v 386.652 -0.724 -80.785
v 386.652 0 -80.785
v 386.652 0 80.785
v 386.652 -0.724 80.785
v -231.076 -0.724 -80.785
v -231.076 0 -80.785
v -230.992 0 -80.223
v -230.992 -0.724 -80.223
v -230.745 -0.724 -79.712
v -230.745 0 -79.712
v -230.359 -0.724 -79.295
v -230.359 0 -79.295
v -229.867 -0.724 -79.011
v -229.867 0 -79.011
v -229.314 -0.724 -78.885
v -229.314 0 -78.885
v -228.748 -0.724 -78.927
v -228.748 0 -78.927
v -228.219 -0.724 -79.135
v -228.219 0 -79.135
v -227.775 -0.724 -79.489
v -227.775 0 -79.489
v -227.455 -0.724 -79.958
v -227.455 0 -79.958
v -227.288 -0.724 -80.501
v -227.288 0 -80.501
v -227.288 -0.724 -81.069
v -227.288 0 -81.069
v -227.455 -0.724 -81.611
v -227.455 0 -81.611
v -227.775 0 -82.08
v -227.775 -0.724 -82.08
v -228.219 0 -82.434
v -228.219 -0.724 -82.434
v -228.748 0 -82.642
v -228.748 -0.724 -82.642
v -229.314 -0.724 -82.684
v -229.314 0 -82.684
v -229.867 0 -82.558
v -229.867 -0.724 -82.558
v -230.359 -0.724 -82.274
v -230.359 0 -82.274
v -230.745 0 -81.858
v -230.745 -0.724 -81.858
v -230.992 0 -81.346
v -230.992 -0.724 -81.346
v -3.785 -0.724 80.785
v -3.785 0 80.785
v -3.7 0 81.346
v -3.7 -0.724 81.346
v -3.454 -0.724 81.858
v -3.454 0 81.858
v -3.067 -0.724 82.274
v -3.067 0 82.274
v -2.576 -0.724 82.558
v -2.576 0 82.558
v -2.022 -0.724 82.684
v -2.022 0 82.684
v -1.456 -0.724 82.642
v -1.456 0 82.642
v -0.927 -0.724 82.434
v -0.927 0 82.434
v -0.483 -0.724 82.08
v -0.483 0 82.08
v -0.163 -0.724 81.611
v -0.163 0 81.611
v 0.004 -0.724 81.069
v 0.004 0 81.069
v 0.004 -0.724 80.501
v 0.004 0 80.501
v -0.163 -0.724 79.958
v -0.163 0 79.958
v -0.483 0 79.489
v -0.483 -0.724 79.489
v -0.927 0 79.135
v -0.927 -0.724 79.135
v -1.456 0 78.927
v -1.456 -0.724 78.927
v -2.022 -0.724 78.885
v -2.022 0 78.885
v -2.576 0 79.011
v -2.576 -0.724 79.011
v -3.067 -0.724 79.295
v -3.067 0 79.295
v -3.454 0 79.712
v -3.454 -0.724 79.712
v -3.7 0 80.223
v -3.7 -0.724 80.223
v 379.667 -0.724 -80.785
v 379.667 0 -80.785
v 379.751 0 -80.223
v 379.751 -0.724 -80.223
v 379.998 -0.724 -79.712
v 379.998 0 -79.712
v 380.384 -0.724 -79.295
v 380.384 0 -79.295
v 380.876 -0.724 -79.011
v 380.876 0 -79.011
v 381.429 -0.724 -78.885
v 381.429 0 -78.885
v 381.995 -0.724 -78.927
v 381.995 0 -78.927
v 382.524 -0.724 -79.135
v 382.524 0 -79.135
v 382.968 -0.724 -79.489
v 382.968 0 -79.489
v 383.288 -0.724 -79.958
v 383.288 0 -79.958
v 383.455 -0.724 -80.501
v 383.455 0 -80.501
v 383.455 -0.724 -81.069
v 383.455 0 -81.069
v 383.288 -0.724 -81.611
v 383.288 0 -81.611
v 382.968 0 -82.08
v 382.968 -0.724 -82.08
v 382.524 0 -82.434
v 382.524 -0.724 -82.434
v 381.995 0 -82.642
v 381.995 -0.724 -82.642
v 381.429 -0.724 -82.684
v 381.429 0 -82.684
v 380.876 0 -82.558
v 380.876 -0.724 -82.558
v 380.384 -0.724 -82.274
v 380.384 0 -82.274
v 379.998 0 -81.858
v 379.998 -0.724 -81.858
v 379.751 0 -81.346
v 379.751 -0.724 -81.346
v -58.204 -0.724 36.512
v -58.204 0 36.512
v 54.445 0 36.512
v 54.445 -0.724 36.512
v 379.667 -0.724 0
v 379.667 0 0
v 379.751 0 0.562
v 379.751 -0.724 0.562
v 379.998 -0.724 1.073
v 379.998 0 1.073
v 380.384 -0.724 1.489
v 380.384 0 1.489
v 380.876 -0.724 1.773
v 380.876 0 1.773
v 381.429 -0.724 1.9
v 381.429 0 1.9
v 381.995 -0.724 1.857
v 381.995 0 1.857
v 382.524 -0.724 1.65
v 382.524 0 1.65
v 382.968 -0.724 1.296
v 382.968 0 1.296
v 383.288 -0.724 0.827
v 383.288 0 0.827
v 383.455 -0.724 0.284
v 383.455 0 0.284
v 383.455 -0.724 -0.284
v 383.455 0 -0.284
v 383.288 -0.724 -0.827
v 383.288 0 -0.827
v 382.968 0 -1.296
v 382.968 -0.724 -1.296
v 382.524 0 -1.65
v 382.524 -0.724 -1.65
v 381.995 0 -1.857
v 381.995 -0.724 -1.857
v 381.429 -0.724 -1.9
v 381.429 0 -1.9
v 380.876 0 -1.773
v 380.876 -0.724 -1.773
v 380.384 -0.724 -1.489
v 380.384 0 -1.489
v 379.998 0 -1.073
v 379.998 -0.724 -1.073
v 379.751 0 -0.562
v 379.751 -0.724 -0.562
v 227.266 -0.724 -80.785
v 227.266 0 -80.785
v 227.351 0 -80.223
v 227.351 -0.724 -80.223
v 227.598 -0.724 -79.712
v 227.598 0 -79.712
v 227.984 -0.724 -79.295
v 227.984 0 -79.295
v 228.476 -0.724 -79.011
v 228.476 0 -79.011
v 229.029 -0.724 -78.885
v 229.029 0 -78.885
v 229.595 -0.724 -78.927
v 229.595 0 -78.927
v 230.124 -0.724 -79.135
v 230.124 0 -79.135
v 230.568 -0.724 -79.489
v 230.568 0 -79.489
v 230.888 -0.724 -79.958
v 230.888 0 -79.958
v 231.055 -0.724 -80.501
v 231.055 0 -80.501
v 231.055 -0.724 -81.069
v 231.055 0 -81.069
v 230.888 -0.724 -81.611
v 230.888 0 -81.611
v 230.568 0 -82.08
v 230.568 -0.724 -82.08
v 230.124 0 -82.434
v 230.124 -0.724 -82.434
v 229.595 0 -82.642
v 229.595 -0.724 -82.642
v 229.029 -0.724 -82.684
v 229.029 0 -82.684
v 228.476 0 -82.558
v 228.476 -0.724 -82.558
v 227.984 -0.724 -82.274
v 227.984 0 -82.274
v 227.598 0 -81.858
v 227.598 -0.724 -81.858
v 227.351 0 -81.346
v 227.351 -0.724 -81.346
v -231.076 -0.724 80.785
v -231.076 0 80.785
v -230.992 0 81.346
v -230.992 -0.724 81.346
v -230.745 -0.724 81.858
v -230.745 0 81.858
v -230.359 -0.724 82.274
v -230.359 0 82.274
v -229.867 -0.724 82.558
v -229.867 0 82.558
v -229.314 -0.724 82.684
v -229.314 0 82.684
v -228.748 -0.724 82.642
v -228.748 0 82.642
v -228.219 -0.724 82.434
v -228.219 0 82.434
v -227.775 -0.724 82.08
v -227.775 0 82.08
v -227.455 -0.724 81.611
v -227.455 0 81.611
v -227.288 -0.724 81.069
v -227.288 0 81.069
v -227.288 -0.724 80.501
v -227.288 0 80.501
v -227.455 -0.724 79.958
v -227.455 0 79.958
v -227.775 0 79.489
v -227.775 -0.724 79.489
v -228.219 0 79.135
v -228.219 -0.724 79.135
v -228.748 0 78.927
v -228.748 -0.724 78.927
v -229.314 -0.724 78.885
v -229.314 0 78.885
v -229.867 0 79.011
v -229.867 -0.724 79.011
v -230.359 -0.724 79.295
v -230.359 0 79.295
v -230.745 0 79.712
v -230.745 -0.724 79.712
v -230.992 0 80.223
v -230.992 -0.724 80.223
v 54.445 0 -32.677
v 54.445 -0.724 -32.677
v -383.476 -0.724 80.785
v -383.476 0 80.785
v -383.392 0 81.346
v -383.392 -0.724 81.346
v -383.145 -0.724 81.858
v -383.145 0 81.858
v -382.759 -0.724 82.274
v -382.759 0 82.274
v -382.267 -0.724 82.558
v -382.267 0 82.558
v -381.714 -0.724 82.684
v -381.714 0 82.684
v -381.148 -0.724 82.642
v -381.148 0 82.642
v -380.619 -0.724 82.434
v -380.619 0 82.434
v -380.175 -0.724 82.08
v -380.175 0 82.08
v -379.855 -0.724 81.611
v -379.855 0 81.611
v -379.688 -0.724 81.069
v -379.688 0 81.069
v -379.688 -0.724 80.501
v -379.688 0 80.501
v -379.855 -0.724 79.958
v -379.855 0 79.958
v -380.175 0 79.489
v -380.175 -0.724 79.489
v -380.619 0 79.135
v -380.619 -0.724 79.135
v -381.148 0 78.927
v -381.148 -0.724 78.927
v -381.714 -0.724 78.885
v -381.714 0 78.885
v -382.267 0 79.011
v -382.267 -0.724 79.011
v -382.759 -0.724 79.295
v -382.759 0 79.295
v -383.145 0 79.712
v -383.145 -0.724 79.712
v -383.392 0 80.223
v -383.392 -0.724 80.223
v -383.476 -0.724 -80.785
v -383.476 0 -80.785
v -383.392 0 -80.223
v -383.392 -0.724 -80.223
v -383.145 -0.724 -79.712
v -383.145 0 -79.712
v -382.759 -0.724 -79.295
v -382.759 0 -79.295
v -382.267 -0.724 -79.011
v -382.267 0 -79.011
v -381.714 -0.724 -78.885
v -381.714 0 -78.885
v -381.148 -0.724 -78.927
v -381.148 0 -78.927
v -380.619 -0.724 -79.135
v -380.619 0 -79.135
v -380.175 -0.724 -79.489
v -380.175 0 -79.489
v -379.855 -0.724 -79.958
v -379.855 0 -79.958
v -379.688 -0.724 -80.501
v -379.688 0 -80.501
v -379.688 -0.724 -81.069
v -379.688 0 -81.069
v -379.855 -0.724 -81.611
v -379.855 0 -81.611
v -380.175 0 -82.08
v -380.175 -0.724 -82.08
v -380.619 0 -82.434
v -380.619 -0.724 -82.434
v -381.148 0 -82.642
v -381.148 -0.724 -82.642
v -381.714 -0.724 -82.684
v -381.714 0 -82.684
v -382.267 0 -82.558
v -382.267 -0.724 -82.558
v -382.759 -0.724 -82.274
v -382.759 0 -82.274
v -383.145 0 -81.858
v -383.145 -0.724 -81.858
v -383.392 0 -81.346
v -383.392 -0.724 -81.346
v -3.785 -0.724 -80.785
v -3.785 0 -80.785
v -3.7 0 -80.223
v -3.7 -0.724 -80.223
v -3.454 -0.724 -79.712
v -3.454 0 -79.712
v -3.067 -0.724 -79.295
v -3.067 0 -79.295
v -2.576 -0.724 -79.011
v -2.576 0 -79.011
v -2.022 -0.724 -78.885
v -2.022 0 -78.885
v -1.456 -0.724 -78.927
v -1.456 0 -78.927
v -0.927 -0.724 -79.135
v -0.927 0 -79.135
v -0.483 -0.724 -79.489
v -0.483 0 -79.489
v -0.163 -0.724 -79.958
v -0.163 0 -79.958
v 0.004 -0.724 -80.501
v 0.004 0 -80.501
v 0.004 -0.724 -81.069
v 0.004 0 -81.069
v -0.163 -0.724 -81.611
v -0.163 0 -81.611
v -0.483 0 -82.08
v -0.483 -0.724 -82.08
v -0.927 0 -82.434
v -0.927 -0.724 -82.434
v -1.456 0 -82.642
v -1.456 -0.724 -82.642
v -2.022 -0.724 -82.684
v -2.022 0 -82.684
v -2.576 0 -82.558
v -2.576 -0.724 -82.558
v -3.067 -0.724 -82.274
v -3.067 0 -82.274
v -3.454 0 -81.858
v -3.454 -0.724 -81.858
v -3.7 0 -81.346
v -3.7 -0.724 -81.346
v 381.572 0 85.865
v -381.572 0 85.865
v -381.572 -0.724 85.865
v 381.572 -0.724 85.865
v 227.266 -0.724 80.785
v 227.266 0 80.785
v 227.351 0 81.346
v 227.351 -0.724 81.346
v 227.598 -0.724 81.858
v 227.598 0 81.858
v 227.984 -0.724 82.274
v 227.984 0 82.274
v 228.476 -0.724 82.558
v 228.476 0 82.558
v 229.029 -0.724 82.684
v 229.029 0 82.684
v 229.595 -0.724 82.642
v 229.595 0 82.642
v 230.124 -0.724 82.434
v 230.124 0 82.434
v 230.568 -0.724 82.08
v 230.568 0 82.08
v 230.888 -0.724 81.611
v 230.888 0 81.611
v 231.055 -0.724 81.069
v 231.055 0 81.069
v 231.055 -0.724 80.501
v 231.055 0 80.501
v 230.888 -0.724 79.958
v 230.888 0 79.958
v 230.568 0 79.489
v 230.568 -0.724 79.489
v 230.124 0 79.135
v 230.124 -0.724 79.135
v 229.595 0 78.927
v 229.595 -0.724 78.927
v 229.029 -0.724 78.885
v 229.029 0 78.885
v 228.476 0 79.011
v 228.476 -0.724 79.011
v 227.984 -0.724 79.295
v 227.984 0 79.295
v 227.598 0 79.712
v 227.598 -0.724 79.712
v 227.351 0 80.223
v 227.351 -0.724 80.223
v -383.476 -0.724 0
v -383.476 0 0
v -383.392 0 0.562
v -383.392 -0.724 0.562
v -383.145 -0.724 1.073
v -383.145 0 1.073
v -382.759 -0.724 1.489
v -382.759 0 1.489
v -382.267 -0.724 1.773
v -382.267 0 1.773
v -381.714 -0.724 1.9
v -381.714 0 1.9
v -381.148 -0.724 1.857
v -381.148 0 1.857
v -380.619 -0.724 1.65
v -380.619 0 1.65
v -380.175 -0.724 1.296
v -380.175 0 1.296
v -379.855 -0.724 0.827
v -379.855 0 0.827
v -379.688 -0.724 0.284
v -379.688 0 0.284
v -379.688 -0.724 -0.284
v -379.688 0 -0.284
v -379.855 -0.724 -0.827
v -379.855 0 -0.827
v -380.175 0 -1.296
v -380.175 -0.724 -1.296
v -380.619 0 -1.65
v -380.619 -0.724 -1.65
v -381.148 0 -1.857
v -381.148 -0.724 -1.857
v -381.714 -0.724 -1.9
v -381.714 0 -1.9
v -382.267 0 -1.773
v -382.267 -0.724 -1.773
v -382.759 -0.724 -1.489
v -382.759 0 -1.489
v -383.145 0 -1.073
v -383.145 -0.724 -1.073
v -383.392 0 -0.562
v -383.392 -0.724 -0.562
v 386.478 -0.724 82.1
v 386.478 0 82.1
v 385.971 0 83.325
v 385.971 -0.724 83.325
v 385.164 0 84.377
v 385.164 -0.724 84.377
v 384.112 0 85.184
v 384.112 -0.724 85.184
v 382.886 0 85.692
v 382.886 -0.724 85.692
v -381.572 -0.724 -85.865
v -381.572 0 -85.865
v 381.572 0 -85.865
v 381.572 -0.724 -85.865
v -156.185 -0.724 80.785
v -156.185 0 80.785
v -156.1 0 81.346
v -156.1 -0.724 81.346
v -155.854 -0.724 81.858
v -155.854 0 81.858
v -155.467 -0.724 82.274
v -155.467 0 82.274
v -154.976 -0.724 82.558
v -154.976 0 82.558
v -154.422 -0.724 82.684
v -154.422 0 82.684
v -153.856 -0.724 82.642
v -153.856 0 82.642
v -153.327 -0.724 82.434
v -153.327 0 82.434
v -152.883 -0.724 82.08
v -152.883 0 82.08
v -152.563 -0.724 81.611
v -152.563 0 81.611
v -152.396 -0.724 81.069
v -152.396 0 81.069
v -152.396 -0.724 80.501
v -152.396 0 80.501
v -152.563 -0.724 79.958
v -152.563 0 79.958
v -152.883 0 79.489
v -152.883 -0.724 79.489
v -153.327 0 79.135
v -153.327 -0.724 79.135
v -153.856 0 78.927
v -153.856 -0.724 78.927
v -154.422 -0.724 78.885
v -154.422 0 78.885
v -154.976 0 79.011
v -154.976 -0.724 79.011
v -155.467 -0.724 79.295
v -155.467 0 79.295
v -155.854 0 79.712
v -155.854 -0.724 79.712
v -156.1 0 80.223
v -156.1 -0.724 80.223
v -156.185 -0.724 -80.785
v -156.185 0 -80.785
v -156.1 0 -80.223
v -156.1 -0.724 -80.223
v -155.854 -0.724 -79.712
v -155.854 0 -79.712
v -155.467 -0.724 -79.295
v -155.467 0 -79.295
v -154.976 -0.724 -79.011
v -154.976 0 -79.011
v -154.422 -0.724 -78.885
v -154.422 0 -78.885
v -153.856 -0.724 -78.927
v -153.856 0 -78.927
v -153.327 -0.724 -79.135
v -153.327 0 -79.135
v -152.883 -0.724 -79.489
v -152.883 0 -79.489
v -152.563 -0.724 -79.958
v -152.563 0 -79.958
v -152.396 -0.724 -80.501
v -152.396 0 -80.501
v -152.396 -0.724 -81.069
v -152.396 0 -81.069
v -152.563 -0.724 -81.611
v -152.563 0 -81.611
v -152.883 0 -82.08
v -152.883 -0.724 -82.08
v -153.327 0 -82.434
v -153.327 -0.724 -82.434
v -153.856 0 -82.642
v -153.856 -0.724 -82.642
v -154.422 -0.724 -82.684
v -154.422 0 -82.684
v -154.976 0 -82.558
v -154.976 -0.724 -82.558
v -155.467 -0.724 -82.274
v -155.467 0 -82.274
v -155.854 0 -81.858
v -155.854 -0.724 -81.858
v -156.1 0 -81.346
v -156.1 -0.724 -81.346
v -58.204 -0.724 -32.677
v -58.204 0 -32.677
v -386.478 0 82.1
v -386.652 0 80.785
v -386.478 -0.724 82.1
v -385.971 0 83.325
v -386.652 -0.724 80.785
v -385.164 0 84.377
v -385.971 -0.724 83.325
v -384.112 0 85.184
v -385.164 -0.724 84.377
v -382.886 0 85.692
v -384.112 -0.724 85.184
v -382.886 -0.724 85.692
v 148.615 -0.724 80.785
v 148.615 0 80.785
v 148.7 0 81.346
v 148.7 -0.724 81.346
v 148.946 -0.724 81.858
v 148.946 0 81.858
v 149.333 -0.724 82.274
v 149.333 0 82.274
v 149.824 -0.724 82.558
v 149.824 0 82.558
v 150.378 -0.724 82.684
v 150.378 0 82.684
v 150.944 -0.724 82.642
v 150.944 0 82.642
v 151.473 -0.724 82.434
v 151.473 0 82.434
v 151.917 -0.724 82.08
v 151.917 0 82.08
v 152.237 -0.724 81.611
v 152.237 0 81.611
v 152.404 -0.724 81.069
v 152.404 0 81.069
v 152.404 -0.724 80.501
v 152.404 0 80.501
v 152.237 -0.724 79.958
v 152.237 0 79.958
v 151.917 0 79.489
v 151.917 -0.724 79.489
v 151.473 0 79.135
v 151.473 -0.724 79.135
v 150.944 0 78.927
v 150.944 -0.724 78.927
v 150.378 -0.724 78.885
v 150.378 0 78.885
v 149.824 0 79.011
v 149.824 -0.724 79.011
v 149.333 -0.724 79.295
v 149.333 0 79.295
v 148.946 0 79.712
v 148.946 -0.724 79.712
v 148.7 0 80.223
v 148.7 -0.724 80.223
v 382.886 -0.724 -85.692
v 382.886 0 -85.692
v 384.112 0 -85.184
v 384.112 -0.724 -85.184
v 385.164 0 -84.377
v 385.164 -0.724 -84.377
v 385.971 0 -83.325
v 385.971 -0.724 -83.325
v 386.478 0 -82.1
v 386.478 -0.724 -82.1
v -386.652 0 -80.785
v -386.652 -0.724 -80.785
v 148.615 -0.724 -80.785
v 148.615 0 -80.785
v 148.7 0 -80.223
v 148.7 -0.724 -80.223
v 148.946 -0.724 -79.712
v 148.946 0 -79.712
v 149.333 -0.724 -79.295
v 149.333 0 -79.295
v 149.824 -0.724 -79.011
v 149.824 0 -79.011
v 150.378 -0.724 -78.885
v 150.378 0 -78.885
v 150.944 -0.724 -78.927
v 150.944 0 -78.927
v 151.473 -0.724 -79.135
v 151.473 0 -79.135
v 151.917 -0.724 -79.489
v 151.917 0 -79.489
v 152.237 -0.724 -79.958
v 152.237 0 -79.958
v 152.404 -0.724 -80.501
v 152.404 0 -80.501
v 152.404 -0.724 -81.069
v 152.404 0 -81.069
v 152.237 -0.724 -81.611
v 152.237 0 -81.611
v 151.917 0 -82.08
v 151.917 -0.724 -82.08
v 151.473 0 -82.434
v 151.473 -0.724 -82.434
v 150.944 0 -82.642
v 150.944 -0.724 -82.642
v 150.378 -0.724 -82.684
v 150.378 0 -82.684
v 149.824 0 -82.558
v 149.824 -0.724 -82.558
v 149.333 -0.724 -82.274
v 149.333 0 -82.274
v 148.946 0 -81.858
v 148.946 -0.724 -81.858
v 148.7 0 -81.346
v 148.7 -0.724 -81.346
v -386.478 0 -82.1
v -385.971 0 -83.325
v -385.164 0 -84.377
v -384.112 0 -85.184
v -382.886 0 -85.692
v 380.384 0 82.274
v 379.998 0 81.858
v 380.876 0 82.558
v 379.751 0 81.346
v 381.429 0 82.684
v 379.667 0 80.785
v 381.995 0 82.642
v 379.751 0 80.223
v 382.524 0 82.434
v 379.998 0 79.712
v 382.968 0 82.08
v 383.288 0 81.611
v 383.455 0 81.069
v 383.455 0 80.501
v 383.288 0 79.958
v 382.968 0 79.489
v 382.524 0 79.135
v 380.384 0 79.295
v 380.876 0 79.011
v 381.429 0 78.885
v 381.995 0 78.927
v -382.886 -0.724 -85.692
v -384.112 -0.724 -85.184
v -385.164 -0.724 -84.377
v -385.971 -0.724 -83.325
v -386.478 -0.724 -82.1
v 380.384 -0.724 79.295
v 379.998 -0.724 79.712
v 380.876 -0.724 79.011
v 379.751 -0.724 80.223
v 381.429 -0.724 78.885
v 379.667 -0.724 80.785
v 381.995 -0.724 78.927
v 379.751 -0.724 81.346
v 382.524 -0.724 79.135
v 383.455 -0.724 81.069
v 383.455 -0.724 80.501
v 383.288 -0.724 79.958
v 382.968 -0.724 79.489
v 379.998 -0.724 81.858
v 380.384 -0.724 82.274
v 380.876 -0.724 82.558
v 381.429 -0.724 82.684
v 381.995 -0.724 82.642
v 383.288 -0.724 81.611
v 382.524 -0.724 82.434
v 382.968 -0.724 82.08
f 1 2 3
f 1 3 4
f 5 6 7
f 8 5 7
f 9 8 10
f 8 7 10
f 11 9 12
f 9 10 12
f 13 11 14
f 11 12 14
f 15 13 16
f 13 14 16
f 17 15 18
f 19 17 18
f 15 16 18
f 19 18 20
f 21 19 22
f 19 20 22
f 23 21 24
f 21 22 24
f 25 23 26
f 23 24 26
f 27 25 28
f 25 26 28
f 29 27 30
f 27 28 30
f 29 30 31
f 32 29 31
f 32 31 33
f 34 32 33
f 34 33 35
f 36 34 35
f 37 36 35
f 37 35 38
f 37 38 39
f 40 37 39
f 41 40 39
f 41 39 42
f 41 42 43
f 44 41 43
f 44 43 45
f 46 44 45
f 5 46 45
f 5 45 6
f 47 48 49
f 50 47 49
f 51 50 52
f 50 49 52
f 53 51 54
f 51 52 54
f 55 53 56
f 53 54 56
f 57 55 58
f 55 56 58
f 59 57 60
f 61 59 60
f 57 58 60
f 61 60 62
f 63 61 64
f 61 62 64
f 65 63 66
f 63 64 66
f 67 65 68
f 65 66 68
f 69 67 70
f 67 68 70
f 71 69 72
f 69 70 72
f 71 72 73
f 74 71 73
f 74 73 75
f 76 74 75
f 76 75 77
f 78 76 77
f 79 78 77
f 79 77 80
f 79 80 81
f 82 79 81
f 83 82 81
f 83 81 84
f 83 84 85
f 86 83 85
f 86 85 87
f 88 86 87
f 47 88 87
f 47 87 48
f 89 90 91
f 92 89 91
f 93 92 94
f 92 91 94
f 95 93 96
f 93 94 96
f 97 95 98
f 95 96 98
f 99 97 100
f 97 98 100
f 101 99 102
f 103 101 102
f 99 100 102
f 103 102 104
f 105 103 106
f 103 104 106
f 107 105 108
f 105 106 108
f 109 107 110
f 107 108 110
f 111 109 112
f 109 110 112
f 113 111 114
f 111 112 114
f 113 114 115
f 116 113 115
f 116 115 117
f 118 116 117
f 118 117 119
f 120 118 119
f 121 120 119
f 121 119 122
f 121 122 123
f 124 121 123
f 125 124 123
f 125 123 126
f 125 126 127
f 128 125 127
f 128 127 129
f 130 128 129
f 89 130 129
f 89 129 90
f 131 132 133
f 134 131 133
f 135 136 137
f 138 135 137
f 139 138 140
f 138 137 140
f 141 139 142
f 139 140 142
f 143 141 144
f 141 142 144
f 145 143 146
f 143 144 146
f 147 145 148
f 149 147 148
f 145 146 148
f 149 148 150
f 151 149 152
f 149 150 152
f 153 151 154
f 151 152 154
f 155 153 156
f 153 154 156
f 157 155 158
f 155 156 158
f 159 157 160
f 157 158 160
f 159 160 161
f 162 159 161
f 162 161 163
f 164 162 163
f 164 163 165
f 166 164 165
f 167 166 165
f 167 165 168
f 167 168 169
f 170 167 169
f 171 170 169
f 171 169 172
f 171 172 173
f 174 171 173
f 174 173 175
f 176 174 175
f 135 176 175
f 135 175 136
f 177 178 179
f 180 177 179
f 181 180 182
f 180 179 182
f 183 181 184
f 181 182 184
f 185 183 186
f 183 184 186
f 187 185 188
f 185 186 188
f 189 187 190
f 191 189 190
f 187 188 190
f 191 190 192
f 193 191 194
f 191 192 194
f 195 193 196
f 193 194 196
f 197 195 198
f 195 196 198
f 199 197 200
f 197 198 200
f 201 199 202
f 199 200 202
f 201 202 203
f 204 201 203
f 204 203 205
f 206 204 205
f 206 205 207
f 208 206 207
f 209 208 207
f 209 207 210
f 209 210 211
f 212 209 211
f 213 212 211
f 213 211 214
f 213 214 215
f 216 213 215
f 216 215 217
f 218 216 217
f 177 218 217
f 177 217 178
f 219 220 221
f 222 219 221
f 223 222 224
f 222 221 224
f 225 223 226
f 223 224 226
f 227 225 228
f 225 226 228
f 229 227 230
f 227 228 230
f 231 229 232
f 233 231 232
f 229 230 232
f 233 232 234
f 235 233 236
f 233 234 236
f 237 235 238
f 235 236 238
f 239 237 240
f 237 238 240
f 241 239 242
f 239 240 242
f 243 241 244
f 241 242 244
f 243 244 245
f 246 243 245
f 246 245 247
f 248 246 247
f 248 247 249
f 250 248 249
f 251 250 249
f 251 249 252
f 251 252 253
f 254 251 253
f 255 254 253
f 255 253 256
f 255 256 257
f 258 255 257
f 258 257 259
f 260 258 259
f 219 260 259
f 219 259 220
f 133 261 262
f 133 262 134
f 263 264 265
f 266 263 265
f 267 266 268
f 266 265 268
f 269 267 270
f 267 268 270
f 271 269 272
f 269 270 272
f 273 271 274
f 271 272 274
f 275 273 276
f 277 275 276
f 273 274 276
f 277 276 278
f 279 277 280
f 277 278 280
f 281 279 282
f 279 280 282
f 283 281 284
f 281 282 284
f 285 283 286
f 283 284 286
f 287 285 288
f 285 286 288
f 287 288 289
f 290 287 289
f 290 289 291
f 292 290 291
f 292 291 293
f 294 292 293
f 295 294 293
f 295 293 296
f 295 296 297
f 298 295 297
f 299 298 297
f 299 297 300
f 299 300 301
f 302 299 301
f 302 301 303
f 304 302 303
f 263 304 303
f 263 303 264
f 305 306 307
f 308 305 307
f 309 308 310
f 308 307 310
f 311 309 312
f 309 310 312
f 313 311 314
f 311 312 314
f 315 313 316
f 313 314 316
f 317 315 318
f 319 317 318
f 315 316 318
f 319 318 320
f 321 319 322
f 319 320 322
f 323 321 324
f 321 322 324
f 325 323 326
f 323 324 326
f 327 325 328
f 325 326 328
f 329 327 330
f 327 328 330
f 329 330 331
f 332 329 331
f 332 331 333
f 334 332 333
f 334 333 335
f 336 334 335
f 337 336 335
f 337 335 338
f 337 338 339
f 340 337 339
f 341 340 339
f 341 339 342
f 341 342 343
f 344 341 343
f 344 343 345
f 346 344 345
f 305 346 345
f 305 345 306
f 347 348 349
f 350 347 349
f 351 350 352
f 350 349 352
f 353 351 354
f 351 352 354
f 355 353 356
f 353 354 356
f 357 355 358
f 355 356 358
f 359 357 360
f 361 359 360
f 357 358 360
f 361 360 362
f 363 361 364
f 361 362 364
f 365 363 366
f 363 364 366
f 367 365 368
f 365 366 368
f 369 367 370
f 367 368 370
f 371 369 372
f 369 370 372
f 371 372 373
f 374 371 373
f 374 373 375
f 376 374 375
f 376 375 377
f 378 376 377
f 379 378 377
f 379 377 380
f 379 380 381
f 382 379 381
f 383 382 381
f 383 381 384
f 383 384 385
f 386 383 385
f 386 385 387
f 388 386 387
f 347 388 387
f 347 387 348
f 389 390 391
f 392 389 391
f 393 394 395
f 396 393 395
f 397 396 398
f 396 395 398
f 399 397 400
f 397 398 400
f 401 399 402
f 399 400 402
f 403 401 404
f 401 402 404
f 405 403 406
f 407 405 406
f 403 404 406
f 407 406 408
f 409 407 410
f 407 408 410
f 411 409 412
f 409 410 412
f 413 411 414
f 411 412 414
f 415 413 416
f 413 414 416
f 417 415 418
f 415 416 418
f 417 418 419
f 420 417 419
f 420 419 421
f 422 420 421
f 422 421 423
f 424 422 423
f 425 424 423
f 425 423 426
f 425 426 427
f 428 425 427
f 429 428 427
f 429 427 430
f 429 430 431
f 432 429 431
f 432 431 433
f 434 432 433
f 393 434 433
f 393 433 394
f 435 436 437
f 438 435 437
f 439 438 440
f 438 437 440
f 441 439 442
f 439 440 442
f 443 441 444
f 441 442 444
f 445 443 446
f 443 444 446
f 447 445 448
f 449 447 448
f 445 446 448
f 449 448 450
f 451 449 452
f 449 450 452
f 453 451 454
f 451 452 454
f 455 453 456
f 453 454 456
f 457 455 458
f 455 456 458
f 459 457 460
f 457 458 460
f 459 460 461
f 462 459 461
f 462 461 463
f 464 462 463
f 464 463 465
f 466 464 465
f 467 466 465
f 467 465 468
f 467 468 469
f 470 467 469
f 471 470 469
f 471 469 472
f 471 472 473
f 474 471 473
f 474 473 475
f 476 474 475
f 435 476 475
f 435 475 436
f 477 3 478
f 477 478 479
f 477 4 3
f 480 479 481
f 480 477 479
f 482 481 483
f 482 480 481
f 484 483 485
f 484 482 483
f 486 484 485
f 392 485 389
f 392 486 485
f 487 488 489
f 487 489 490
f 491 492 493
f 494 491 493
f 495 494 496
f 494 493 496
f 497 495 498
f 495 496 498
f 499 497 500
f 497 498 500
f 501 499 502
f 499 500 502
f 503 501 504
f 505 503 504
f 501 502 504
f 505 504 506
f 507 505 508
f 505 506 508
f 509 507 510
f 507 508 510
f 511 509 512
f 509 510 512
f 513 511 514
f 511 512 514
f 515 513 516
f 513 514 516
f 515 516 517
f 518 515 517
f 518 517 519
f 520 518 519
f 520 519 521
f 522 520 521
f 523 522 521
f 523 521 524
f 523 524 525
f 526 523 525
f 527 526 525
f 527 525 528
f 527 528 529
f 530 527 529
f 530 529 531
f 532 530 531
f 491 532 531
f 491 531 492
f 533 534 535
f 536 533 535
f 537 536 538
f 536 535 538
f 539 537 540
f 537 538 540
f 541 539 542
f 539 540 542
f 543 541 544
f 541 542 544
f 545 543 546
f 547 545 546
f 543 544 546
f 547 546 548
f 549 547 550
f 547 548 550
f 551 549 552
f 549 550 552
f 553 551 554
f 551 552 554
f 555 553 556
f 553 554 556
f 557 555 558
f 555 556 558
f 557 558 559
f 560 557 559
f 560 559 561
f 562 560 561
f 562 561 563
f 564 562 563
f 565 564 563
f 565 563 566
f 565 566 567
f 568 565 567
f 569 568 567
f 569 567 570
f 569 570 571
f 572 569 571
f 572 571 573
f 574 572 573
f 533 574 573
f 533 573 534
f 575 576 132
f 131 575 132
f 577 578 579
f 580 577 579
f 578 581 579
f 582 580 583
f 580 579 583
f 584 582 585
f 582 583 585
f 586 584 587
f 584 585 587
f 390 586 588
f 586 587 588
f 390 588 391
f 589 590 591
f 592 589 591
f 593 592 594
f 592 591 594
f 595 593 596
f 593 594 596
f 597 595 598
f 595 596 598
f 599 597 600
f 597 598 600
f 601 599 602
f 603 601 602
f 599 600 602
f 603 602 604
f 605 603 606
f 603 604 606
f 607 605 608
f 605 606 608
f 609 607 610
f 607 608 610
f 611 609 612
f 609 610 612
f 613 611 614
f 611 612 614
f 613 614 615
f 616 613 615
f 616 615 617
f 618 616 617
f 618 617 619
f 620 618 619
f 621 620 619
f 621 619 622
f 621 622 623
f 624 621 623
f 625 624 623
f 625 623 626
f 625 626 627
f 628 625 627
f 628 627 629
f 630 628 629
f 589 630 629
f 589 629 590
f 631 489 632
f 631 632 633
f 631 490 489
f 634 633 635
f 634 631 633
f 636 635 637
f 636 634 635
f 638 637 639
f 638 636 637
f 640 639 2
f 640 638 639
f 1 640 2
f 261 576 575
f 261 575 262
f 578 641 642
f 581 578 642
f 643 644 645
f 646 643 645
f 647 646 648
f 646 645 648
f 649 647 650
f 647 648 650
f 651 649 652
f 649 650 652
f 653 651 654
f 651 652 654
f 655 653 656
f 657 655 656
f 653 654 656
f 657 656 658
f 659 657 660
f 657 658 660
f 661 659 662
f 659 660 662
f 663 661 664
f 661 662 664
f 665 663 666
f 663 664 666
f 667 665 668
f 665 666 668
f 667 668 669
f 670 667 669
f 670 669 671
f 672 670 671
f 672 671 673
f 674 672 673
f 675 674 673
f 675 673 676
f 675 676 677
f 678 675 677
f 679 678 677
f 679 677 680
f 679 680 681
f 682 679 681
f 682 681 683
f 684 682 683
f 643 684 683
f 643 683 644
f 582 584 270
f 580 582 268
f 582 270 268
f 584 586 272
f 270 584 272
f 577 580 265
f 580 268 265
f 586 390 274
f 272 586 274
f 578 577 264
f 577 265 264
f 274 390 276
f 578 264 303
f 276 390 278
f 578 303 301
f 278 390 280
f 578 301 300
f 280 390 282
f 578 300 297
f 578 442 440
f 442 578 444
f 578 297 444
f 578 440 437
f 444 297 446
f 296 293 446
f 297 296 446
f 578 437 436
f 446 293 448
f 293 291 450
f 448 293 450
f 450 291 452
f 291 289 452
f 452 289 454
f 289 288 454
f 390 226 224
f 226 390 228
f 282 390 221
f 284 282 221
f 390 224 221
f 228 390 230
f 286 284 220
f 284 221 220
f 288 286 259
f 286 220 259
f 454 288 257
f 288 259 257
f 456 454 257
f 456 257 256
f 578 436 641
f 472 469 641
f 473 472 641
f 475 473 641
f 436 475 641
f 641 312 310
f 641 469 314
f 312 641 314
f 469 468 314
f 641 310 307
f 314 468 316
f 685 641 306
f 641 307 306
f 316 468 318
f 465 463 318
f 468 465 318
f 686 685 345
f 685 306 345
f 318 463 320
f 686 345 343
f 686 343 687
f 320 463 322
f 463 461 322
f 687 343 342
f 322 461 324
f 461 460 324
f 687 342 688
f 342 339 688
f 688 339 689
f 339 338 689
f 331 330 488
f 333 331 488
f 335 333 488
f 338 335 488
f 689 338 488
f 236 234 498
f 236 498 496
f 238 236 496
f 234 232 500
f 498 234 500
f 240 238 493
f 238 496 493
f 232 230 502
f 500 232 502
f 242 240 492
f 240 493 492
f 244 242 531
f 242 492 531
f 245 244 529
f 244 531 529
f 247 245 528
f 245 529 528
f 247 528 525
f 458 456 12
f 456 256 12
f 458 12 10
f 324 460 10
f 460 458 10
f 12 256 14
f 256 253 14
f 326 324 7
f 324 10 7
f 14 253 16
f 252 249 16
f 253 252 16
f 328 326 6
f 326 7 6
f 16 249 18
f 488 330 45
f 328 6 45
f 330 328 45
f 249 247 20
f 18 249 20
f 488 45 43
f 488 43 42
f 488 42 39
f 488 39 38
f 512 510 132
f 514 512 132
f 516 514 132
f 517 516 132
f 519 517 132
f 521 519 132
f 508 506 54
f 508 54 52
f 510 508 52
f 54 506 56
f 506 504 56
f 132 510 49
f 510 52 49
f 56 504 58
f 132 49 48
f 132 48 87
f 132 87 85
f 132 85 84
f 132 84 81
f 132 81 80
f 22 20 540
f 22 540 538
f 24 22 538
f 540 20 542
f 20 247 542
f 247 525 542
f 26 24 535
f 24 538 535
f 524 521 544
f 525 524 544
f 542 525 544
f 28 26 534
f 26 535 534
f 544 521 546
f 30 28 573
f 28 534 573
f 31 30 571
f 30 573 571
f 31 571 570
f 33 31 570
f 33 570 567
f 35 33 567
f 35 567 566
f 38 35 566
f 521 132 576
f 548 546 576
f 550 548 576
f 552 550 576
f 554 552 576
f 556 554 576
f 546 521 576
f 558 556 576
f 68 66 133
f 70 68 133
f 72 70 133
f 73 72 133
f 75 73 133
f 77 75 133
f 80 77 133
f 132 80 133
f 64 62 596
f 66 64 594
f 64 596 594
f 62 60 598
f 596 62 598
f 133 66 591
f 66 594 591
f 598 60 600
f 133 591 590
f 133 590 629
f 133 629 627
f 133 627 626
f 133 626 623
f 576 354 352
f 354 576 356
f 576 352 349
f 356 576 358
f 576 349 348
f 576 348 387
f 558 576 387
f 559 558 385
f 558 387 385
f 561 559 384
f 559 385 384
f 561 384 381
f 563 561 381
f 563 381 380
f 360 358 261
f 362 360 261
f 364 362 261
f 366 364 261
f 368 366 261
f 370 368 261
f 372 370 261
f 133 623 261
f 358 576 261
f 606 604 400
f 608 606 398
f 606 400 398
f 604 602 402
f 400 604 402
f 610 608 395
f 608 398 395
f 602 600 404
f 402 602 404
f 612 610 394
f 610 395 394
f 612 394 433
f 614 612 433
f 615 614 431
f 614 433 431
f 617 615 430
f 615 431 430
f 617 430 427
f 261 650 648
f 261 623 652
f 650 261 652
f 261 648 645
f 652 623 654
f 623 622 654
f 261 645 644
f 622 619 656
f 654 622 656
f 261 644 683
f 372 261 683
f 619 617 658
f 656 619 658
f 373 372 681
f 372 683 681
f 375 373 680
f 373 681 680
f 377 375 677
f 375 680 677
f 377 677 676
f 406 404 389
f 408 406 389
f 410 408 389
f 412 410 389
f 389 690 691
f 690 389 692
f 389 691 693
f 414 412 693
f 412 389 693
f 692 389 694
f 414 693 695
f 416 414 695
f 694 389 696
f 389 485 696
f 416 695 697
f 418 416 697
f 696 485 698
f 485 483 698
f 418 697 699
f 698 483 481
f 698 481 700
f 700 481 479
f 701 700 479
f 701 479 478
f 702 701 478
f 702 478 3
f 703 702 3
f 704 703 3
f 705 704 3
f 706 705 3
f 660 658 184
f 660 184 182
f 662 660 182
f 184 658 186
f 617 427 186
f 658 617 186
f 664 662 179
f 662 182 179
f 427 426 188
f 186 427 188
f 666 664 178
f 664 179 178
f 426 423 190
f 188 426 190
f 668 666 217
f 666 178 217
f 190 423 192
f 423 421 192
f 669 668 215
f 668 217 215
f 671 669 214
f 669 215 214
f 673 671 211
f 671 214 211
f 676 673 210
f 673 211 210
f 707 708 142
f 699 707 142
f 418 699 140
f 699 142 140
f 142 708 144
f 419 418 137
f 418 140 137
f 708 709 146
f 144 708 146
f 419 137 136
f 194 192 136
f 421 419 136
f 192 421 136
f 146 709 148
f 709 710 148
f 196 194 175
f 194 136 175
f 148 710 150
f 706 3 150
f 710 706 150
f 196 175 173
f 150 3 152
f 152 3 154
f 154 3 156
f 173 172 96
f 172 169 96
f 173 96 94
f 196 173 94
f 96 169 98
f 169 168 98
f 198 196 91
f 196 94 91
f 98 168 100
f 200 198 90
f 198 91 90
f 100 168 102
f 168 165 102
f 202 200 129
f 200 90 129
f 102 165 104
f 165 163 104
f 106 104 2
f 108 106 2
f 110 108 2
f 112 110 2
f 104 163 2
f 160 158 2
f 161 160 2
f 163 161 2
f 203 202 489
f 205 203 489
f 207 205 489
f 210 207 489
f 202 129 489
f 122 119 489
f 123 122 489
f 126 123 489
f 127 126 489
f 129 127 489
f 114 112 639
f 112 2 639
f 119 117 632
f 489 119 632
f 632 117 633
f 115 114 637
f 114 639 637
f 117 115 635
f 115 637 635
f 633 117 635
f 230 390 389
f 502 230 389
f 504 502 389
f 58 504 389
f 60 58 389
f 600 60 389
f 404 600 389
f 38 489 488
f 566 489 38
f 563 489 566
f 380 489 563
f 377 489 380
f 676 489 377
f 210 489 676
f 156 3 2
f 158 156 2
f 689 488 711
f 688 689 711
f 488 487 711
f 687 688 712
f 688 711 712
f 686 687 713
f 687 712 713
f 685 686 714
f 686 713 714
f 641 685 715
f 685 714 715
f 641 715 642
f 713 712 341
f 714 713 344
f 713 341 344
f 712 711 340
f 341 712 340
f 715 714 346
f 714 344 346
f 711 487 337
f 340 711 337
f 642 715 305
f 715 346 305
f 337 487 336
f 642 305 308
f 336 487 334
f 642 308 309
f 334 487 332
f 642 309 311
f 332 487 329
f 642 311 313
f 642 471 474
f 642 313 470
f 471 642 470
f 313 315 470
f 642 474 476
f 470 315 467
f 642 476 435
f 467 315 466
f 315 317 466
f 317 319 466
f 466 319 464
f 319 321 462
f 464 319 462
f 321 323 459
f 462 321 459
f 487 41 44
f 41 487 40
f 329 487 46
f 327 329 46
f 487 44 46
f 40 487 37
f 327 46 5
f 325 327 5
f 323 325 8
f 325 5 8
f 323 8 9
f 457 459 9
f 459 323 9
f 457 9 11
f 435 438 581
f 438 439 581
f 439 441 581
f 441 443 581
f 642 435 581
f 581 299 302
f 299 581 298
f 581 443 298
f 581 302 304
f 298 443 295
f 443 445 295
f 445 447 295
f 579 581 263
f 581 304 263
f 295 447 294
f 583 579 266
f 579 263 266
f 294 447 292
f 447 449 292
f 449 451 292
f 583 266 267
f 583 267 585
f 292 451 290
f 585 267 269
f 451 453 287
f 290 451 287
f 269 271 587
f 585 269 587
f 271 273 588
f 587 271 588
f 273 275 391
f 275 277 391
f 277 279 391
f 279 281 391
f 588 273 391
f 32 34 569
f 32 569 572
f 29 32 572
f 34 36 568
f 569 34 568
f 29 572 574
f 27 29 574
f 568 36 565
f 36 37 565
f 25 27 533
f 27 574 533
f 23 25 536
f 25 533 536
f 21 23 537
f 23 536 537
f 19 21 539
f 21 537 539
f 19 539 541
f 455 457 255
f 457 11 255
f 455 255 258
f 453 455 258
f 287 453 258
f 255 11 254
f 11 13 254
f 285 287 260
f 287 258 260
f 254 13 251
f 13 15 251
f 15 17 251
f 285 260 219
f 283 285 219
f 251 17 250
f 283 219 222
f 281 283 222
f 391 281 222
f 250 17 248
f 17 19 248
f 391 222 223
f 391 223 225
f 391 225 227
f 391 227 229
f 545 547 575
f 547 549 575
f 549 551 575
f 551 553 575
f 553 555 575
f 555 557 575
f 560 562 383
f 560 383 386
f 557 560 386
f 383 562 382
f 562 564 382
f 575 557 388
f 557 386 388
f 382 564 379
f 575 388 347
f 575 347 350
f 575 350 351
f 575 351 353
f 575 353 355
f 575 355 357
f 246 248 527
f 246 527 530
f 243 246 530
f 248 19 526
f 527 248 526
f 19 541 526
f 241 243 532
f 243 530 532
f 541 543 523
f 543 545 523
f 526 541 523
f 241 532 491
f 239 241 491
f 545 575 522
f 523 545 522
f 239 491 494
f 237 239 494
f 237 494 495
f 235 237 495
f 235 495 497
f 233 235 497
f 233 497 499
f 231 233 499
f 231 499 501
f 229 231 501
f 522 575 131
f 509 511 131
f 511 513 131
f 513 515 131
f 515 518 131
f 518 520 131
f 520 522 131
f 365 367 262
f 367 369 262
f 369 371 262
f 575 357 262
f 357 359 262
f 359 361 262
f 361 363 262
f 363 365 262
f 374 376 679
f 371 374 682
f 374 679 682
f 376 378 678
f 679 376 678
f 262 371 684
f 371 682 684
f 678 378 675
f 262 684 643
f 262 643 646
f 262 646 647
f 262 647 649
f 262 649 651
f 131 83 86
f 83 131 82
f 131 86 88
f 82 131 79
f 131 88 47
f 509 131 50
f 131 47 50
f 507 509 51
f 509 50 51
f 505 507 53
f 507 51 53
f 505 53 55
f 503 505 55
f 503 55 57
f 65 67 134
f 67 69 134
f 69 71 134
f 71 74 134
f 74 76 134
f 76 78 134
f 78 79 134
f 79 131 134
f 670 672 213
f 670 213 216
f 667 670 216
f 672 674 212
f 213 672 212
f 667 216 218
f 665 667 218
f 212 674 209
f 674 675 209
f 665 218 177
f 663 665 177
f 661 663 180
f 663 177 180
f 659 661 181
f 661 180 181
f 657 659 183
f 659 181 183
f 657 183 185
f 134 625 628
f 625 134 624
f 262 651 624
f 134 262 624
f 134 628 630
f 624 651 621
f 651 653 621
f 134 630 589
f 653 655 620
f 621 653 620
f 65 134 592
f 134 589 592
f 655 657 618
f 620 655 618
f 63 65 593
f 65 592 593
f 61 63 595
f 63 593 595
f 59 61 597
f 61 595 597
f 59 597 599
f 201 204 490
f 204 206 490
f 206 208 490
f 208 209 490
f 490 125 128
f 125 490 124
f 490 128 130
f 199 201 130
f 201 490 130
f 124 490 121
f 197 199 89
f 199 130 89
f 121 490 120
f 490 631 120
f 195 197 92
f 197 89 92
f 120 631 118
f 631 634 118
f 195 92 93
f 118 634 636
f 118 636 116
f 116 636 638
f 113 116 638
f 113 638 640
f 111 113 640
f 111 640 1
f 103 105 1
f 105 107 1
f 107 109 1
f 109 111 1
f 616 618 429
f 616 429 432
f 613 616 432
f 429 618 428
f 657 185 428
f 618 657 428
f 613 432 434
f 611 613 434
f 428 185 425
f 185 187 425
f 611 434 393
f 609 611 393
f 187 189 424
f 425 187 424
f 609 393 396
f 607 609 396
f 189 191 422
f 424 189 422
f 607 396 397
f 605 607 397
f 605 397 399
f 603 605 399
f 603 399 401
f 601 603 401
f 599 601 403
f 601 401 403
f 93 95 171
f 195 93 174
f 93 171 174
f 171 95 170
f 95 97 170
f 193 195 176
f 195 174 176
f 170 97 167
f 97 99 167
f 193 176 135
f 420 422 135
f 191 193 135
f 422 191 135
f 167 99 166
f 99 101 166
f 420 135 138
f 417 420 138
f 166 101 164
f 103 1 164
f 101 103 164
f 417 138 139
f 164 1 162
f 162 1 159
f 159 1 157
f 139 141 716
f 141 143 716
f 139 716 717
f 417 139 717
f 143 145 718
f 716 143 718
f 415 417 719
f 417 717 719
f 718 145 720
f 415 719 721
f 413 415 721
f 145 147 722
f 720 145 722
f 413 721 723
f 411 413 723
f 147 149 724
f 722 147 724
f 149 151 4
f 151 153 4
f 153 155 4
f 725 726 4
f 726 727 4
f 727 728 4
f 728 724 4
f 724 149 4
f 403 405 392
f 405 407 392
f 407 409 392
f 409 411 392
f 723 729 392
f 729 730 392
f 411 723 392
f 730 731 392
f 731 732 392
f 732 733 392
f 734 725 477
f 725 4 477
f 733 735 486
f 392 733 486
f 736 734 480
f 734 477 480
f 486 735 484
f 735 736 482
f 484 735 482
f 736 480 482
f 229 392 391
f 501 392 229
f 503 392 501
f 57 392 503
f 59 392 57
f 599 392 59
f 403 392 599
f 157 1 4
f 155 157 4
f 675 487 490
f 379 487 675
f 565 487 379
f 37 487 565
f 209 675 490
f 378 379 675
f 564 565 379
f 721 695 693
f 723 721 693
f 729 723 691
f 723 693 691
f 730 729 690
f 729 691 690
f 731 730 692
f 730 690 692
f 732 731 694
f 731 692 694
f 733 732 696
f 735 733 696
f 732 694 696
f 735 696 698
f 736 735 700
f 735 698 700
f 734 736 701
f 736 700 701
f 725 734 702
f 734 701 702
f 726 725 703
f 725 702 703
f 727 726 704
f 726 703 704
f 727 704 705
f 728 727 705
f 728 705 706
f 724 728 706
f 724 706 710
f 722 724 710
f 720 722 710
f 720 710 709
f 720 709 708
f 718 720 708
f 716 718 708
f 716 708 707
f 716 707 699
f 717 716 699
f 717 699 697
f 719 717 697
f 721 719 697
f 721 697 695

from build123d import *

# Parameters (mm, degrees)
F0_W     = 752.983
F0_H     = 151.4094
F0_W_2   = 112.649
F0_H_2   = 69.1896
F1_DEPTH = 0.7239
F2_DEPTH = 10.16
F3_DEPTH = 10.16
F4_DEPTH = 10.16
F5_DEPTH = 10.16
F6_R     = 1.905
F7_DEPTH = 0.7249
F8_R     = 5.08


with BuildPart() as f1:
    # F0 (on Front) → F1 (new body)
    with BuildSketch(Plane.XZ):
        Rectangle(F0_W, F0_H)
        with Locations((-1.8796, 1.9177)):
            Rectangle(F0_W_2, F0_H_2, mode=Mode.SUBTRACT)
    extrude(amount=F1_DEPTH)

    # F2 (add): a face of the model
    f2_faces = [f1.faces().sort_by_distance(p)[0] for p in [
        (0, -0.36195, 75.7047),
    ]]
    extrude(f2_faces, amount=F2_DEPTH)

    # F3 (add): a face of the model
    f3_faces = [f1.faces().sort_by_distance(p)[0] for p in [
        (0, -0.36195, -75.7047),
    ]]
    extrude(f3_faces, amount=F3_DEPTH)

    # F4 (add): a face of the model
    f4_faces = [f1.faces().sort_by_distance(p)[0] for p in [
        (376.4915, -0.36195, 0),
    ]]
    extrude(f4_faces, amount=F4_DEPTH)

    # F5 (add): a face of the model
    f5_faces = [f1.faces().sort_by_distance(p)[0] for p in [
        (-376.4915, -0.36195, 0),
    ]]
    extrude(f5_faces, amount=F5_DEPTH)

    # F6 (on face) → F7 (cut, through all)
    with BuildSketch(Plane(origin=(0, 0, 0), x_dir=(-1, 0, 0), z_dir=(0, 1, 0))):
        with Locations((-381.5715, 80.7847)):
            Circle(F6_R)
        with Locations((1.8796, 80.7847)):
            Circle(F6_R)
        with Locations((381.5715, 80.7847)):
            Circle(F6_R)
        with Locations((-381.5715, -80.7847)):
            Circle(F6_R)
        with Locations((1.8796, -80.7847)):
            Circle(F6_R)
        with Locations((381.5715, -80.7847)):
            Circle(F6_R)
        with Locations((154.2796, 80.7847)):
            Circle(F6_R)
        with Locations((229.1715, 80.7847)):
            Circle(F6_R)
        with Locations((-150.5204, 80.7847)):
            Circle(F6_R)
        with Locations((-229.1715, 80.7847)):
            Circle(F6_R)
        with Locations((-381.5715, 0)):
            Circle(F6_R)
        with Locations((381.5715, 0)):
            Circle(F6_R)
        with Locations((-229.1715, -80.7847)):
            Circle(F6_R)
        with Locations((-150.5204, -80.7847)):
            Circle(F6_R)
        with Locations((154.2796, -80.7847)):
            Circle(F6_R)
        with Locations((229.1715, -80.7847)):
            Circle(F6_R)
    extrude(amount=-F7_DEPTH, mode=Mode.SUBTRACT)

    # F8
    f8_edges = [f1.edges().sort_by_distance(p)[0] for p in [
        (386.6515, -0.36195, 85.8647),
        (386.6515, -0.36195, -85.8647),
        (-386.6515, -0.36195, -85.8647),
        (-386.6515, -0.36195, 85.8647),
    ]]
    fillet(f8_edges, radius=F8_R)


solid = f1.part
